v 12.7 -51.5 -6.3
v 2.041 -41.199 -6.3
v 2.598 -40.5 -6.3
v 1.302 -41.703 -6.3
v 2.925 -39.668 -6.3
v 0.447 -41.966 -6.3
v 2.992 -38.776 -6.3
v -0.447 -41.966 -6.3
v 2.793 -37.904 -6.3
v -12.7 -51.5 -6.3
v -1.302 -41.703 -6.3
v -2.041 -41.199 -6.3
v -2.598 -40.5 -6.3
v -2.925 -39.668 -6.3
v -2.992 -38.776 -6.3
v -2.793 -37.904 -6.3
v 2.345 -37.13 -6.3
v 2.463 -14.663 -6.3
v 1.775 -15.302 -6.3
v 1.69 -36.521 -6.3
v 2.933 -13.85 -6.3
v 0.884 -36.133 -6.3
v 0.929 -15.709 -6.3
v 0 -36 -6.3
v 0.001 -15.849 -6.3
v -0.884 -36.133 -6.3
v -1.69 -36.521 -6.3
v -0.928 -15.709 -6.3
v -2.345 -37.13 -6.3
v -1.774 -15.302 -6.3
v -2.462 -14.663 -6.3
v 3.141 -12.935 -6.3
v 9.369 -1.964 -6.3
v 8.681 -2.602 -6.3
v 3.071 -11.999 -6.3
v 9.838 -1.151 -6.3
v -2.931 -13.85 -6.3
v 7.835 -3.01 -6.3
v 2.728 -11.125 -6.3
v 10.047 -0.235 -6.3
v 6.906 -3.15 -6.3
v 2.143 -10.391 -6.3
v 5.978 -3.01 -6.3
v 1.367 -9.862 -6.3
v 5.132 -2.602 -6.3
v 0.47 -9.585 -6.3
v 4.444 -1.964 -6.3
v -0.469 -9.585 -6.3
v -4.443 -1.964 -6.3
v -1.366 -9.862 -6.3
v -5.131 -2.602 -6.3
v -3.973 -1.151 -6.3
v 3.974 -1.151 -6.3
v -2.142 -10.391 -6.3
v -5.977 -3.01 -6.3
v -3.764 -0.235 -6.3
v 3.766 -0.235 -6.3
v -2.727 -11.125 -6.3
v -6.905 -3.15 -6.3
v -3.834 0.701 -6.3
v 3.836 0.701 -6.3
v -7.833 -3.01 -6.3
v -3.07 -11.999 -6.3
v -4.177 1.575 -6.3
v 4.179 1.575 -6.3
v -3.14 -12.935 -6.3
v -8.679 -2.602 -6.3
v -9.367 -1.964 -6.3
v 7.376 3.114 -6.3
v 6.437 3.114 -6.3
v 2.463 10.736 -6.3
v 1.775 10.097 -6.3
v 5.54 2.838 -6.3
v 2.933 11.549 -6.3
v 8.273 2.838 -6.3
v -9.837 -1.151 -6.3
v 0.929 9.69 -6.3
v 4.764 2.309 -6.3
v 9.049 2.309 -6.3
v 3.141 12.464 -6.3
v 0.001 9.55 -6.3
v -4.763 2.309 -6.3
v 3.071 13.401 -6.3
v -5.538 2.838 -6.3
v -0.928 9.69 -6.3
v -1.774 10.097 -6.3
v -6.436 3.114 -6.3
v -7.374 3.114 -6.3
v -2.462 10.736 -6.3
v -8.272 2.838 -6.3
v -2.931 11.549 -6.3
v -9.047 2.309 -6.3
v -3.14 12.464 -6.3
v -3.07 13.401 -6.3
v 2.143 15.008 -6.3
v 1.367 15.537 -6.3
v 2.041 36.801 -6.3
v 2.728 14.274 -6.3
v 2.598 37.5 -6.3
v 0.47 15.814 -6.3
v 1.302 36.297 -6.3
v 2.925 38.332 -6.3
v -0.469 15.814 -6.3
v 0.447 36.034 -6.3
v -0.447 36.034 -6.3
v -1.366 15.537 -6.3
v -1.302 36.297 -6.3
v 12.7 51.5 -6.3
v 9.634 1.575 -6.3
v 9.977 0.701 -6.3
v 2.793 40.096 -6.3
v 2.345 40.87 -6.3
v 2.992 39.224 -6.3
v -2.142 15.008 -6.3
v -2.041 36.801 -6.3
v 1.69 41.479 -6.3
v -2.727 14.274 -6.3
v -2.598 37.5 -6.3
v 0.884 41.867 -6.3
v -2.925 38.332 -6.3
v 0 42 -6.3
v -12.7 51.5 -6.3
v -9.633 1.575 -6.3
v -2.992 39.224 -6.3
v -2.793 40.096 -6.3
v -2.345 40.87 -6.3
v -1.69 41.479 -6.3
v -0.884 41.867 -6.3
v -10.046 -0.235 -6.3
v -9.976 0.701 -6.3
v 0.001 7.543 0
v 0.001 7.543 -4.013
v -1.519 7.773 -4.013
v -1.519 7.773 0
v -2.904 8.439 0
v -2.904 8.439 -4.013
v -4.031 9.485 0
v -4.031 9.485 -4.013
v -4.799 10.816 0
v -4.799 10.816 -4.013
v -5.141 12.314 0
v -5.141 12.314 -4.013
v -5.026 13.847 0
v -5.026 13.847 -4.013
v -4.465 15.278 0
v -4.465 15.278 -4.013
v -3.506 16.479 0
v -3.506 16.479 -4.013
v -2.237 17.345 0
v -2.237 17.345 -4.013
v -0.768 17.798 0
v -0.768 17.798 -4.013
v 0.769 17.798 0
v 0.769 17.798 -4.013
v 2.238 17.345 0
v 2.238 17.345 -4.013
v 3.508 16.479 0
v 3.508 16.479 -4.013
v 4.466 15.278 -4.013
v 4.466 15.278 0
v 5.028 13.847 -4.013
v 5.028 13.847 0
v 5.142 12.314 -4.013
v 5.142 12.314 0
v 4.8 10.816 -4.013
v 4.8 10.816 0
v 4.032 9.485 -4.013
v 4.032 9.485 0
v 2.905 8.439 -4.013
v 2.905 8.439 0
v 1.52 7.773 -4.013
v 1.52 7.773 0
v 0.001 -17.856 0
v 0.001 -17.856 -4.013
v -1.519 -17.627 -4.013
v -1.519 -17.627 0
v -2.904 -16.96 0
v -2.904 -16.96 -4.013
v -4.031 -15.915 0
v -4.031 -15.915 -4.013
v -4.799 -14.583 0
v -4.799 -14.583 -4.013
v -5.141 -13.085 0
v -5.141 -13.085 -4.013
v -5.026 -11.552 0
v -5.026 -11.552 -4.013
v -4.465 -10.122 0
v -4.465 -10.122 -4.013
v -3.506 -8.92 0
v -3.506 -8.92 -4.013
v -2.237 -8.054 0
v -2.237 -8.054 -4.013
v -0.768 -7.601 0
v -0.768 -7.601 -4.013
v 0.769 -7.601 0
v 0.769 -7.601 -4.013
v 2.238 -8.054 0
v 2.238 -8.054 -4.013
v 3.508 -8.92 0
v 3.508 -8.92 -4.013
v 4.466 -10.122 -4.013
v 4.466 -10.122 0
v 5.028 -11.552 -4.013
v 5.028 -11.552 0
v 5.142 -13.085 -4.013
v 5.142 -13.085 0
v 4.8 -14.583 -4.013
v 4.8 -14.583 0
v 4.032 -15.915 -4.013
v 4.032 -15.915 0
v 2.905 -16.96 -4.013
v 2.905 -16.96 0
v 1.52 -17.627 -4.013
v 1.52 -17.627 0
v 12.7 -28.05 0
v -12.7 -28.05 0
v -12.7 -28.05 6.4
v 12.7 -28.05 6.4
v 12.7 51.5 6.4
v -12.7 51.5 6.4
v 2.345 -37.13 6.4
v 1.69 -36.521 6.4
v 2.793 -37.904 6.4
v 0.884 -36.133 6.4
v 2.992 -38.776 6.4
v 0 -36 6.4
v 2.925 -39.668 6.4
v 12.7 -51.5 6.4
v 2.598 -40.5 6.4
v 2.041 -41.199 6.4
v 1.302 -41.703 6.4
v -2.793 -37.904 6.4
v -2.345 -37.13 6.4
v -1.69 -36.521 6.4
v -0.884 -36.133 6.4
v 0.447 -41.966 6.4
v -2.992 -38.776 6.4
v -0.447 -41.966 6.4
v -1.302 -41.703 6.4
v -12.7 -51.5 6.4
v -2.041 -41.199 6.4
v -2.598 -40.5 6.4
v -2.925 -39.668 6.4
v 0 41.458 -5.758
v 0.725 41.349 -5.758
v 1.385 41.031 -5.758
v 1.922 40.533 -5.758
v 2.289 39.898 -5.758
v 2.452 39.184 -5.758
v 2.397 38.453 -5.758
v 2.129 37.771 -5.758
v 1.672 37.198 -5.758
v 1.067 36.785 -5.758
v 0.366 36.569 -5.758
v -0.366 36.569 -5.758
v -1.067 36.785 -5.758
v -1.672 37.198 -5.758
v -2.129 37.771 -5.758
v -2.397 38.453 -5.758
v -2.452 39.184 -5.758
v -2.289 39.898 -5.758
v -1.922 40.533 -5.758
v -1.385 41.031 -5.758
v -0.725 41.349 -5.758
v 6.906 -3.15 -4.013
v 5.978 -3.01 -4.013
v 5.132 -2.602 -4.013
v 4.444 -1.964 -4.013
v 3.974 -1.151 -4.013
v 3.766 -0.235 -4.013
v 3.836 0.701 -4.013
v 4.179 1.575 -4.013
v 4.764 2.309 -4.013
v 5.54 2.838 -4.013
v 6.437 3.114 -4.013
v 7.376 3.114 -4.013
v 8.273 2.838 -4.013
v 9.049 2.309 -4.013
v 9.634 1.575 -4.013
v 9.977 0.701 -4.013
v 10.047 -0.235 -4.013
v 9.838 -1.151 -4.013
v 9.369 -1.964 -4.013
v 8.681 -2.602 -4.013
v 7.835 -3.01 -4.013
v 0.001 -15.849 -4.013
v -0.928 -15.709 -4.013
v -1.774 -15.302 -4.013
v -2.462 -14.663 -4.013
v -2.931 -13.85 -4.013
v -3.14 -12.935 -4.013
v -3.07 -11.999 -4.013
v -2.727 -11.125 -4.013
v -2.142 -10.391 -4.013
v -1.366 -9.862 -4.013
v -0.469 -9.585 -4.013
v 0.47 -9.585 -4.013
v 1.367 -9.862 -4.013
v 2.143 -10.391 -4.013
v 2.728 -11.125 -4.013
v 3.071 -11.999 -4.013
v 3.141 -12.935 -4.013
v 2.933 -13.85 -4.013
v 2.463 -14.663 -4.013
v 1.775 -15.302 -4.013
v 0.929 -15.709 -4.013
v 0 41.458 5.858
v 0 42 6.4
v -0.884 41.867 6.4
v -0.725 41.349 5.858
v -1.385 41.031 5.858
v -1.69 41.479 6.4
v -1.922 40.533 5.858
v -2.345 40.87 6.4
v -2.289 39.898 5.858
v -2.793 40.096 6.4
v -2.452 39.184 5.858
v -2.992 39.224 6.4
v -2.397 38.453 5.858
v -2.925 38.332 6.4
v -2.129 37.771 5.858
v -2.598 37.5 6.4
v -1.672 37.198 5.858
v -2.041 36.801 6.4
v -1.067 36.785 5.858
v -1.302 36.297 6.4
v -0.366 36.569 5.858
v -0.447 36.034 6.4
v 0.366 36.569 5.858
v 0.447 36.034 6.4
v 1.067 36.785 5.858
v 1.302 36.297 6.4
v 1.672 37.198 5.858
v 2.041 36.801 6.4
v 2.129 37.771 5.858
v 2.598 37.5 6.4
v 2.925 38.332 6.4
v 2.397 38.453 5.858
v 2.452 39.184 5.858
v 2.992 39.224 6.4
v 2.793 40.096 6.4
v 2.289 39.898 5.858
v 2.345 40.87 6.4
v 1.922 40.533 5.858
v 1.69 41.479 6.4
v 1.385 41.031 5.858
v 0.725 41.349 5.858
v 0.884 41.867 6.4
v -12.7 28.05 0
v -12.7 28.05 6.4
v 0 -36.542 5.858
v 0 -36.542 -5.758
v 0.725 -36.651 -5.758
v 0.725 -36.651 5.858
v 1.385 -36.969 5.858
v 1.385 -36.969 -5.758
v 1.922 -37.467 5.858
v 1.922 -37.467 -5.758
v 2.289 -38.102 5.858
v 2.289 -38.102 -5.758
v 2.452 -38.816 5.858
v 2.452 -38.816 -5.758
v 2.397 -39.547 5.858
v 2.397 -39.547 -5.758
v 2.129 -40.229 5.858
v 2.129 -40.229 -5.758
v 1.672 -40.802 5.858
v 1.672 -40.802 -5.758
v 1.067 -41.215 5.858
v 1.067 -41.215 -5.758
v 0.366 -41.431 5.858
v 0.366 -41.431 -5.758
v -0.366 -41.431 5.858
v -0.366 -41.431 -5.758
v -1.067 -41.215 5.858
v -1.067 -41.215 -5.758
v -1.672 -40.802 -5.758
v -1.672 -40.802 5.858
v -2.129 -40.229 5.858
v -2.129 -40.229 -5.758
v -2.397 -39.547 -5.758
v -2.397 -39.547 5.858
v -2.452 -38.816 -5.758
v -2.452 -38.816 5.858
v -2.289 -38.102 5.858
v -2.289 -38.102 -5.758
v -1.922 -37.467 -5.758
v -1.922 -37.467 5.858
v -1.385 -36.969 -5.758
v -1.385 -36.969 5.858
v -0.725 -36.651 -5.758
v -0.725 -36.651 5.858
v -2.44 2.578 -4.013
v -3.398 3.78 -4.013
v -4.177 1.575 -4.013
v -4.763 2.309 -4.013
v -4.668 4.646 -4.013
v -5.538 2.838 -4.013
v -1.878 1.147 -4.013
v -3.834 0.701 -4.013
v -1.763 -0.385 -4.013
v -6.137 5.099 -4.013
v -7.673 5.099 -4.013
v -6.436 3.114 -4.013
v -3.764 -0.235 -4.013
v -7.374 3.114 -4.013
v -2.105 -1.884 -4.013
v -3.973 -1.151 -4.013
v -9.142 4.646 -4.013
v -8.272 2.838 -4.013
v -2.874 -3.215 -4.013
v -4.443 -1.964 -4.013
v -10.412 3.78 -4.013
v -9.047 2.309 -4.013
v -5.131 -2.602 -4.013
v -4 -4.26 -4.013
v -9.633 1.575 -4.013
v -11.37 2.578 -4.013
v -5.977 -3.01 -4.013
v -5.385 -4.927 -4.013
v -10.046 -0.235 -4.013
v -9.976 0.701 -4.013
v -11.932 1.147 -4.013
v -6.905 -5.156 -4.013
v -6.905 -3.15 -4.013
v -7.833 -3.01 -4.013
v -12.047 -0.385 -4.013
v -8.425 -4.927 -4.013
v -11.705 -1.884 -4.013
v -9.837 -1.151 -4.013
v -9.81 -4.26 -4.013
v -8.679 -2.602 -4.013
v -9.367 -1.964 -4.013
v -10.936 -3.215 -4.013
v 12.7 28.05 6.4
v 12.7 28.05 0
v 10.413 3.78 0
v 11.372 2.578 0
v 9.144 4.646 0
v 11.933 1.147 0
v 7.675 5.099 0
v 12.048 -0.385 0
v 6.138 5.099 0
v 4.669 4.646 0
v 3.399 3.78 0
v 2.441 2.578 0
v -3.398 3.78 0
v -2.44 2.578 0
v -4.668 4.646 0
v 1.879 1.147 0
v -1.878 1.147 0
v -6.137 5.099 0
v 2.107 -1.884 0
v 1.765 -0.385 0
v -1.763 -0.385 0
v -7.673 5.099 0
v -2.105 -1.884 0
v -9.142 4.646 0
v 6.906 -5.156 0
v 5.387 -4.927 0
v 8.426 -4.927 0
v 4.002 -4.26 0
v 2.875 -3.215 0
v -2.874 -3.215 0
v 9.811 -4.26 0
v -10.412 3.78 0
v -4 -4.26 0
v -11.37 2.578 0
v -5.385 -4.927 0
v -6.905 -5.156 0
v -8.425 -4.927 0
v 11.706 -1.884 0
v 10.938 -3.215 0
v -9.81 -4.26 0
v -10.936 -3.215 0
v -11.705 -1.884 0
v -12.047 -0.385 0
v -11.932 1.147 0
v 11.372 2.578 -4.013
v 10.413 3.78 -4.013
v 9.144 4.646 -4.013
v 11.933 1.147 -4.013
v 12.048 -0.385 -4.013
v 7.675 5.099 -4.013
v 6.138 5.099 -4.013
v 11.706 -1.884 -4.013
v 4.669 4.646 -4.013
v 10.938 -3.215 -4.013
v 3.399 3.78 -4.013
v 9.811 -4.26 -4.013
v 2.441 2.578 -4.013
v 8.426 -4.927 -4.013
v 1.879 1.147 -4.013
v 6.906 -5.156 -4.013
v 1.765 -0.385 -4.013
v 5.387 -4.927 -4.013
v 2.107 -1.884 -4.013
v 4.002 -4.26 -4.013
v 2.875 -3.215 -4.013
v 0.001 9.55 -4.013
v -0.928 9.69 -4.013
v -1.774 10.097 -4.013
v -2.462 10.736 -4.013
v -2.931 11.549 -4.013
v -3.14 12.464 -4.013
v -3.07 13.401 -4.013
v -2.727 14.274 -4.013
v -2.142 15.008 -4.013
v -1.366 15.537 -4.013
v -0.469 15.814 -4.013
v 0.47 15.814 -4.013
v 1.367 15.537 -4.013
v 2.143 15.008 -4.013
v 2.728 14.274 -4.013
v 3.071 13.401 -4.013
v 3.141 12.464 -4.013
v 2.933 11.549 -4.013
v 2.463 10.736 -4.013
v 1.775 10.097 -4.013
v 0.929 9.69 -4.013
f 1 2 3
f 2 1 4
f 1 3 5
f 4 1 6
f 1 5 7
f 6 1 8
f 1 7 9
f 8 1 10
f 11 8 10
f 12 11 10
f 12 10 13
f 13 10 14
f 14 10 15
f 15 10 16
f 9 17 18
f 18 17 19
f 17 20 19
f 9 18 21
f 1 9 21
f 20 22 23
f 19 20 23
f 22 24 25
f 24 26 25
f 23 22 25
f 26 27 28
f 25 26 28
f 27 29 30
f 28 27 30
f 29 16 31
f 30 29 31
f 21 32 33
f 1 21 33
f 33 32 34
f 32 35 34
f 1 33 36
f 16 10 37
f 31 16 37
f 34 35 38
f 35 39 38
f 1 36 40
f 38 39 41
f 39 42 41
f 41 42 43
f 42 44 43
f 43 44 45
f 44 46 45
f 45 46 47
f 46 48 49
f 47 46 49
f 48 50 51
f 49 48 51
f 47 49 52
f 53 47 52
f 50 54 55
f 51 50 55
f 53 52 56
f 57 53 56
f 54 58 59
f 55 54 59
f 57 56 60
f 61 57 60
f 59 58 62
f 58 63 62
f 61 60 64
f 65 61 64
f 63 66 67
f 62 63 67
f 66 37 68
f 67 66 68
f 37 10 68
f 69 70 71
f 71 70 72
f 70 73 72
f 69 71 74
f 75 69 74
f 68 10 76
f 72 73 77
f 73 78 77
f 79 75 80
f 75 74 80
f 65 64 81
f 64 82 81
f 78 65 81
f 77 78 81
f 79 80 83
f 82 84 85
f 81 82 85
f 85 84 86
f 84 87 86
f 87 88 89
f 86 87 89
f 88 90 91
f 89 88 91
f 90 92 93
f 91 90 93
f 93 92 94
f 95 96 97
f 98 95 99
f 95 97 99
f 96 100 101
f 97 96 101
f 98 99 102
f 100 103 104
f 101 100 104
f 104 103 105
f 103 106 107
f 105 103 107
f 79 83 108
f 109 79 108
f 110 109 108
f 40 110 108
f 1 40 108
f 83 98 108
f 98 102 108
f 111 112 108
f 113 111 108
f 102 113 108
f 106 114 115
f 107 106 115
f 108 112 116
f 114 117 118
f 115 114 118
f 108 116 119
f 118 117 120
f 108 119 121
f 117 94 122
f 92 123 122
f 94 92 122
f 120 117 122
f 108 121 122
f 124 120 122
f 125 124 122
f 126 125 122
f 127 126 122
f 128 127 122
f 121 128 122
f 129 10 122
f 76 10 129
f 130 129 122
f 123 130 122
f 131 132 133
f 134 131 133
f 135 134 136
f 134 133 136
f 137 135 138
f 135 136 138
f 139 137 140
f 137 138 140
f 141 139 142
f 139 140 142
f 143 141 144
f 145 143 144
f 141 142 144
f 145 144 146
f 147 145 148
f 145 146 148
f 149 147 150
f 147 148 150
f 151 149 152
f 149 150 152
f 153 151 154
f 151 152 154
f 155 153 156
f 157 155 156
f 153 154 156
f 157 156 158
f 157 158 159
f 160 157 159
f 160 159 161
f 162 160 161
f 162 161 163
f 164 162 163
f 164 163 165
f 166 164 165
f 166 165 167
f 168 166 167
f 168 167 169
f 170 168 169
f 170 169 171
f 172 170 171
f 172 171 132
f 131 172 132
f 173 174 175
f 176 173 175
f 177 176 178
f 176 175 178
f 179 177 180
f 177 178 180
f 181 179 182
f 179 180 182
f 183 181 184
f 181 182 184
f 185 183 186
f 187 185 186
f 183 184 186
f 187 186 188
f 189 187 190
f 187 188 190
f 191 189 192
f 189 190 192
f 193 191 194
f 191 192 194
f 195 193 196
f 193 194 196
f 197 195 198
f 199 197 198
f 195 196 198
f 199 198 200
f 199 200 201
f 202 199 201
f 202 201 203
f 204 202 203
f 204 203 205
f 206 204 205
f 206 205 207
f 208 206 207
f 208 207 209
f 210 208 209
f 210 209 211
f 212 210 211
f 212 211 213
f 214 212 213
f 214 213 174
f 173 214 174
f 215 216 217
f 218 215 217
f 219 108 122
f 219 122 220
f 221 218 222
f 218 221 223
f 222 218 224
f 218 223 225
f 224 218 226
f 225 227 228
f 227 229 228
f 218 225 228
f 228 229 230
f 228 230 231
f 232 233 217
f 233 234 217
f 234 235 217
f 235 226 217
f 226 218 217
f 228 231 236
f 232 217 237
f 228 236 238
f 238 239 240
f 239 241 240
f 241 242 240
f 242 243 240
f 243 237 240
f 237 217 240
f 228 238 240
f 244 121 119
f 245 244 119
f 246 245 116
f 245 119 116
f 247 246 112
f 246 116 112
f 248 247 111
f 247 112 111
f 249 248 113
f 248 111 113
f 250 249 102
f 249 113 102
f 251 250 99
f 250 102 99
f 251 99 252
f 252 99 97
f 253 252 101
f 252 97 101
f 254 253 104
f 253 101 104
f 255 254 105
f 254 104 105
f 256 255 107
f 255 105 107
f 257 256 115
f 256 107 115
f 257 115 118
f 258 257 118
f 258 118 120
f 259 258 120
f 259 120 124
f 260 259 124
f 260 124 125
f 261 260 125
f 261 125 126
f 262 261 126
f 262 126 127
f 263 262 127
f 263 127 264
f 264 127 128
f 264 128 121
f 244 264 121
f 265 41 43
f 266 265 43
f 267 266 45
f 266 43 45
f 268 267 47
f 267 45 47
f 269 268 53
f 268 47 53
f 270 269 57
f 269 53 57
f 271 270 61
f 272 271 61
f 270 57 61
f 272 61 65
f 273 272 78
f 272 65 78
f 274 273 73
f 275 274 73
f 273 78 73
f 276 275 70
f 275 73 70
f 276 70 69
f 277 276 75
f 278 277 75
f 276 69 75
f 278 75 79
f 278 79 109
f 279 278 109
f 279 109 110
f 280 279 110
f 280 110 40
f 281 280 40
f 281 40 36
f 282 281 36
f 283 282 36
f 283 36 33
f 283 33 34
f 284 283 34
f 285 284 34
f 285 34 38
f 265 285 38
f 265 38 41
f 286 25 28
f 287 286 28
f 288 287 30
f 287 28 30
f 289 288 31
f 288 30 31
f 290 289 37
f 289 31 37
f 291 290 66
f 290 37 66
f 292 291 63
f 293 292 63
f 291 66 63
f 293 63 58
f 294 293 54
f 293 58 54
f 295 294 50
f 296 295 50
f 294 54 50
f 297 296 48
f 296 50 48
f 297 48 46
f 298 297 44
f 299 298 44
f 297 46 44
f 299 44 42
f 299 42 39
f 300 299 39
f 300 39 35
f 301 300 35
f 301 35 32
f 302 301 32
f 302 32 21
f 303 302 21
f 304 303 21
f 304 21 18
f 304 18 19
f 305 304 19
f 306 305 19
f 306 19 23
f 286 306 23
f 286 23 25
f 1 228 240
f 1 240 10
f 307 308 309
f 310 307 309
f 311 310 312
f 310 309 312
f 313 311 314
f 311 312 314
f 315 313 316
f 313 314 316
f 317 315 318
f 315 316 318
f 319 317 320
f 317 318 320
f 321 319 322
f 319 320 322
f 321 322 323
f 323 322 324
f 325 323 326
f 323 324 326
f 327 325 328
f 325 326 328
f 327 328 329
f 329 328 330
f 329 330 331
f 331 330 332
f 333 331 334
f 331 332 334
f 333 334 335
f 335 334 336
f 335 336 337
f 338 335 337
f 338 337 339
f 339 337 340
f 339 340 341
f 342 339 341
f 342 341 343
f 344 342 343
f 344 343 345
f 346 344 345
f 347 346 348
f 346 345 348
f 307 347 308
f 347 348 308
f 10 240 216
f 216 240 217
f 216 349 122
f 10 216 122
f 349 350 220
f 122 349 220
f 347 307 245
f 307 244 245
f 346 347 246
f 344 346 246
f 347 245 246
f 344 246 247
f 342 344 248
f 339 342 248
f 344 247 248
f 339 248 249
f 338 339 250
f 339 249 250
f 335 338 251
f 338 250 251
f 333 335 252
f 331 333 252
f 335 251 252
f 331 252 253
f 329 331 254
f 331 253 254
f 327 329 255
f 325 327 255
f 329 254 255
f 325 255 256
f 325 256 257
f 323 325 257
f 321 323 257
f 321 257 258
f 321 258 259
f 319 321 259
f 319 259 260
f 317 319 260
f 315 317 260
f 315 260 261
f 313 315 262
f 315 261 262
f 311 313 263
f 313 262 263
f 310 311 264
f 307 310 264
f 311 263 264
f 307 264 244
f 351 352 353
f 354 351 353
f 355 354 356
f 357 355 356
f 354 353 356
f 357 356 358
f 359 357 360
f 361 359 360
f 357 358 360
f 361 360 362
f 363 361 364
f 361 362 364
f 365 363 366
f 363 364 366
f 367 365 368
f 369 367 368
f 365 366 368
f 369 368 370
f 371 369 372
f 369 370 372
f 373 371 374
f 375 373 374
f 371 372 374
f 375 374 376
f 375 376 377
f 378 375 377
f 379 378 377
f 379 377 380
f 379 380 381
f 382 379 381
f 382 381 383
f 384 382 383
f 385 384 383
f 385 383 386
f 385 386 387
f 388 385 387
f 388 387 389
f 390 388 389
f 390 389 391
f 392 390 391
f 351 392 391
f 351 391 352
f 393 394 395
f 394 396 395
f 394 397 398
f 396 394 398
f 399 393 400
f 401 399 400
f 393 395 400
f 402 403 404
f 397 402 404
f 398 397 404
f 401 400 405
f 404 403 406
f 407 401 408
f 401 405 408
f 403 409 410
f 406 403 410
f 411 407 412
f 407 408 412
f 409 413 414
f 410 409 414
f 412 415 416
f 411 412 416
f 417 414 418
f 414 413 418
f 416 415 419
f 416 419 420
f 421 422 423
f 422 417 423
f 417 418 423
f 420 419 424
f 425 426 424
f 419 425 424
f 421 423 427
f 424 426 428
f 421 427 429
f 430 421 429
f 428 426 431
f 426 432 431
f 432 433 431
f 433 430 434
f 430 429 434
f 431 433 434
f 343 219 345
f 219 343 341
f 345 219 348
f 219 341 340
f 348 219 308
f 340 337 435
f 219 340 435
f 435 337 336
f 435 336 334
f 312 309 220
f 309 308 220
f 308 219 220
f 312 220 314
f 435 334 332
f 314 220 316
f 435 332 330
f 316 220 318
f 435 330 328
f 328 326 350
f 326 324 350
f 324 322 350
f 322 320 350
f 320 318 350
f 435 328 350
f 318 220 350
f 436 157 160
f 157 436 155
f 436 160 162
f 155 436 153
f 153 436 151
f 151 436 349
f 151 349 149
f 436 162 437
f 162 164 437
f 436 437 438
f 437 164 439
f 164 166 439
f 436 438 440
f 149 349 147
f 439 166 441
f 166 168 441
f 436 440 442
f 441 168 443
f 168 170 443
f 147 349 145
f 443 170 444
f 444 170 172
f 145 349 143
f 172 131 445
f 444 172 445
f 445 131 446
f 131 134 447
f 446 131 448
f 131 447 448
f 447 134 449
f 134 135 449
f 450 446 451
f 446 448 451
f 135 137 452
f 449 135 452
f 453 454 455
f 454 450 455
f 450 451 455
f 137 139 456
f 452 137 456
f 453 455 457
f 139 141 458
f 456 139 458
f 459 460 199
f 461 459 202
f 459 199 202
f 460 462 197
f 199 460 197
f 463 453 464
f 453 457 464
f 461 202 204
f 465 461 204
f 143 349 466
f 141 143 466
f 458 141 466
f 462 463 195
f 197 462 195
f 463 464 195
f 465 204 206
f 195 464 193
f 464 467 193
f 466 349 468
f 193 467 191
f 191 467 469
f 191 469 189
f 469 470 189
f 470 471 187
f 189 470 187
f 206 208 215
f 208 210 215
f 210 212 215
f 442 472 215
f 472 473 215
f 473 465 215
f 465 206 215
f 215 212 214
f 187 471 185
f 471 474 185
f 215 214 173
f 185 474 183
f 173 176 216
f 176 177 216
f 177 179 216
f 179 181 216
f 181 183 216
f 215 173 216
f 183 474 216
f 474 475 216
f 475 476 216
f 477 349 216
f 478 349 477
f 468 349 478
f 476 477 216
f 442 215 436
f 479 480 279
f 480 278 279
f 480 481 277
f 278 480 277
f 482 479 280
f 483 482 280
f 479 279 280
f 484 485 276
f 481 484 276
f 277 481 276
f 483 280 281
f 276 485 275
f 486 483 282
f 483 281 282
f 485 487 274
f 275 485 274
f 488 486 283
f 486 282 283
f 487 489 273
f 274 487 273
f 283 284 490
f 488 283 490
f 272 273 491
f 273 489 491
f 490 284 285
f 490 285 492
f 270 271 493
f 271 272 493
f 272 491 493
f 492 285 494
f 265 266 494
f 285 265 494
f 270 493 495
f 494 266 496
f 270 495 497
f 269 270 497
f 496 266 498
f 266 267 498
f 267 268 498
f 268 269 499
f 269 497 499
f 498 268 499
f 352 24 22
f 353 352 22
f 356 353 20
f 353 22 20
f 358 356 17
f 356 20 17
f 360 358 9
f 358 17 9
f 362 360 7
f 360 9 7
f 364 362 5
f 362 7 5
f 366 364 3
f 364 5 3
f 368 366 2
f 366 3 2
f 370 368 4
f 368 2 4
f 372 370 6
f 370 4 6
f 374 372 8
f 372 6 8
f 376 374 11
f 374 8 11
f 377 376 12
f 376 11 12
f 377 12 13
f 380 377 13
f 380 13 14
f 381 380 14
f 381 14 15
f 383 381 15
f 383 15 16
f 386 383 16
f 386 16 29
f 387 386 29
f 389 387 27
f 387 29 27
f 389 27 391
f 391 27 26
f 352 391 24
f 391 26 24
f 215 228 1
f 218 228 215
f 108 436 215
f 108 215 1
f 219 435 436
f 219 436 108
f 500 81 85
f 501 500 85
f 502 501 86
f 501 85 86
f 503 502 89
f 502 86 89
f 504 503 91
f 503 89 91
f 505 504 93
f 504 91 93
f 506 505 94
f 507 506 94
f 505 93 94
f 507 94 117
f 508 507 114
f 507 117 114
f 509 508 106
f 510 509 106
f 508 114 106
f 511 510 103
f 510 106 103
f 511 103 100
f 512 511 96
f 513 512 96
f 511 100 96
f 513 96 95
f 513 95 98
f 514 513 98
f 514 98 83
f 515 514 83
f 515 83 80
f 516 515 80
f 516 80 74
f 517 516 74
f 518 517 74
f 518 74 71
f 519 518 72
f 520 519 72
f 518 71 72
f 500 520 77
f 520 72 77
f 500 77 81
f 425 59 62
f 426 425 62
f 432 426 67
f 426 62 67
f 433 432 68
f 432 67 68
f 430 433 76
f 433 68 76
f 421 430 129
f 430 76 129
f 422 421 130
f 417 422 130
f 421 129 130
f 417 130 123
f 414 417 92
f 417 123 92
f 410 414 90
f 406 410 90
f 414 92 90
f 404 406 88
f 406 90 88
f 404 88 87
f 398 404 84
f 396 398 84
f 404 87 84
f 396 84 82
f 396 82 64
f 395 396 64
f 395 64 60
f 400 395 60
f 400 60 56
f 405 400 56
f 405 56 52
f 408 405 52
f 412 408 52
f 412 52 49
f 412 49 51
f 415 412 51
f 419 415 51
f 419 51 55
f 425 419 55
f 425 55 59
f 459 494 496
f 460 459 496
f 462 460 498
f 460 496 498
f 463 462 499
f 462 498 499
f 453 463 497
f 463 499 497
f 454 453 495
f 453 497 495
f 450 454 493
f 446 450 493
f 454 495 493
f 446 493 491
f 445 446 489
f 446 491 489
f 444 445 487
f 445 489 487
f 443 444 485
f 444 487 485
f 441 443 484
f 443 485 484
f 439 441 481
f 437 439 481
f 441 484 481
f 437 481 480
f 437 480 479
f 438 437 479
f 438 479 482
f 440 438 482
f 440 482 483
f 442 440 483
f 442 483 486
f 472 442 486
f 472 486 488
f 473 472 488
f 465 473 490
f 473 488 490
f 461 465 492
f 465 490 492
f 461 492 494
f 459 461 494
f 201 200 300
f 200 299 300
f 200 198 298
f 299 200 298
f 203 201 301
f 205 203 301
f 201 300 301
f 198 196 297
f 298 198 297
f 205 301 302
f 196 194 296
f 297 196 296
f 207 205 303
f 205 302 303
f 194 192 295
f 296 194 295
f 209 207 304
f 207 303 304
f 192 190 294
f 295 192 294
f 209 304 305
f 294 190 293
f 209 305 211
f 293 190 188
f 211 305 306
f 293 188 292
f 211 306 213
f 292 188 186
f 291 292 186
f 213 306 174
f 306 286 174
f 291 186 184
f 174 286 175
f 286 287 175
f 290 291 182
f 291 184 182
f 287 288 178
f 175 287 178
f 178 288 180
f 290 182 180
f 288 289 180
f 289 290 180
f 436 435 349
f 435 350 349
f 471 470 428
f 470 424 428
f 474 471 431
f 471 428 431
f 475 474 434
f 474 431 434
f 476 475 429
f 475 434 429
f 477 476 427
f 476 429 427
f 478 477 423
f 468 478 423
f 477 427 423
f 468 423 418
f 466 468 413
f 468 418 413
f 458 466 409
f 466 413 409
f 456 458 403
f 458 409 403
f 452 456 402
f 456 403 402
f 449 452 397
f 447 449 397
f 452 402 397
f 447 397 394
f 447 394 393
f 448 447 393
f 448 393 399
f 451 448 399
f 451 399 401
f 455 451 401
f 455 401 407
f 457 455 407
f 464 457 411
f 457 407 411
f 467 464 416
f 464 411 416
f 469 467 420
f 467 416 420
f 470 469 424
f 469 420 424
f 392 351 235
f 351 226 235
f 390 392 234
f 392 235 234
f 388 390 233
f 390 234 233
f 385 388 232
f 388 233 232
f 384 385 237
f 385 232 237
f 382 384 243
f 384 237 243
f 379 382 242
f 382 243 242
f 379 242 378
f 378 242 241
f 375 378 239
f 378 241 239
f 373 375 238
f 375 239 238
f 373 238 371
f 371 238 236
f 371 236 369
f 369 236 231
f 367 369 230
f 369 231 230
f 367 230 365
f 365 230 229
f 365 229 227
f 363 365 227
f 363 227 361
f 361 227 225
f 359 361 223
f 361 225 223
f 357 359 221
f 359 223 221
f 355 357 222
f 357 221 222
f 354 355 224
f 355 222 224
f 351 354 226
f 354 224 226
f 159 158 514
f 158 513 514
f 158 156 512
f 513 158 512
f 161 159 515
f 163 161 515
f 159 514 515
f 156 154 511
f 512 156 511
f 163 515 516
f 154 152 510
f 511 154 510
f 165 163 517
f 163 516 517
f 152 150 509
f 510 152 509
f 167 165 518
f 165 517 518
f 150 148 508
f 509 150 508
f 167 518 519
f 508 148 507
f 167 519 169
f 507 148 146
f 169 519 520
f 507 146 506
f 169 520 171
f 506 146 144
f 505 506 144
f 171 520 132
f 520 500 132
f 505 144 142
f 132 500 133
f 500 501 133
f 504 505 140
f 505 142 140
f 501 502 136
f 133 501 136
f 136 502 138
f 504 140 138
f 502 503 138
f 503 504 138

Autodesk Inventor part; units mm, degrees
sketch "Sketch_1" plane through (0, 0, 0) normal (1, 0, 0) x (0, 1, 0)
  line L0 (-28.05, 6.4) -> (-51.5, 6.4)
  line L1 (-51.5, 6.4) -> (-51.5, -6.3)
  line L2 (-51.5, -6.3) -> (51.5, -6.3)
  line L3 (51.5, -6.3) -> (51.5, 6.4)
  line L4 (51.5, 6.4) -> (28.05, 6.4)
  line L5 (28.05, 6.4) -> (28.05, 0)
  line L6 (28.05, 0) -> (-28.05, 0)
  line L7 (-28.05, 0) -> (-28.05, 6.4)
extrude "Extrusion1" add sketch "Sketch_1" along normal mid plane 25.4
sketch "Sketch_2" plane through (0, 0, 0) normal (1, 0, 0) x (0, 1, 0)
  line L0 (39, -6.3) -> (39, 6.4)
  line L1 (39, 6.4) -> (42, 6.4)
  line L2 (42, 6.4) -> (41.4585, 5.8585)
  line L3 (41.4585, 5.8585) -> (41.4585, -5.7585)
  line L4 (41.4585, -5.7585) -> (42, -6.3)
  line L5 (42, -6.3) -> (39, -6.3)
  line L6 (39, -6.3) -> (39, 6.4)
revolve "Revolution1" cut sketch "Sketch_2" angle 360 about axis through (0, 39, -6.3) along (0, 0, -1)
thread "Thread1" size "M6x1" class "6H" standard "ISO Metric profile" full length
sketch "Sketch_3" plane through (0, 0, 0) normal (1, 0, 0) x (0, 1, 0)
  line L0 (-39, -6.3) -> (-39, 6.4)
  line L1 (-39, 6.4) -> (-36, 6.4)
  line L2 (-36, 6.4) -> (-36.5415, 5.8585)
  line L3 (-36.5415, 5.8585) -> (-36.5415, -5.7585)
  line L4 (-36.5415, -5.7585) -> (-36, -6.3)
  line L5 (-36, -6.3) -> (-39, -6.3)
  line L6 (-39, -6.3) -> (-39, 6.4)
revolve "Revolution2" cut sketch "Sketch_3" angle 360 about axis through (0, -39, -6.3) along (0, 0, -1)
thread "Thread2" size "M6x1" class "6H" standard "ISO Metric profile" full length
sketch "Sketch4" plane through (-12.7, -28.05, 0) normal (0, 0, 1) x (1, 0, 0)
  point P0 (5.795, 28.05)
hole "Hole1" at (-6.905, 0, 0) direction (0, 0, -1) diameter 6.2992 depth 6.3 counterbore diameter 10.3124 counterbore depth 4.0132
pattern_linear "Rectangular Pattern1" count 2 spacing 14.4558 along (0.4777, 0.8785, 0) count 2 spacing 14.4558 along (0.4777, -0.8785, 0) of "Hole1"
ref_plane "screw1_XY" through (-6.905, 0, -4.0132) normal (0, 0, 1) x (1, 0, 0)
ref_plane "screw1_YZ" through (-6.905, 0, -4.0132) normal (1, 0, 0) x (0, 1, 0)
ref_plane "screw1_ZX" through (-6.905, 0, -4.0132) normal (0, 1, 0) x (0, 0, 1)
ref_plane "screw1_1_XY" through (0, 12.7, -4.0132) normal (0, 0, 1) x (1, 0, 0)
ref_plane "screw1_1_YZ" through (0, 12.7, -4.0132) normal (1, 0, 0) x (0, 1, 0)
ref_plane "screw1_1_ZX" through (0, 12.7, -4.0132) normal (0, 1, 0) x (0, 0, 1)
ref_plane "screw2_XY" through (6.905, 0, -4.0132) normal (0, 0, 1) x (1, 0, 0)
ref_plane "screw2_YZ" through (6.905, 0, -4.0132) normal (1, 0, 0) x (0, 1, 0)
ref_plane "screw2_ZX" through (6.905, 0, -4.0132) normal (0, 1, 0) x (0, 0, 1)
ref_plane "screw2_1_XY" through (0, -12.7, -4.0132) normal (0, 0, 1) x (1, 0, 0)
ref_plane "screw2_1_YZ" through (0, -12.7, -4.0132) normal (1, 0, 0) x (0, 1, 0)
ref_plane "screw2_1_ZX" through (0, -12.7, -4.0132) normal (0, 1, 0) x (0, 0, 1)
ref_plane "to_dummy_XY" through (0, 0, 0) normal (0, 0, 1) x (1, 0, 0)
ref_plane "to_dummy_YZ" through (0, 0, 0) normal (1, 0, 0) x (0, 1, 0)
ref_plane "to_dummy_ZX" through (0, 0, 0) normal (0, 1, 0) x (0, 0, 1)
ref_plane "to_wheel1_XY" through (0, 39, 6.4) normal (0, 0, 1) x (1, 0, 0)
ref_plane "to_wheel1_YZ" through (0, 39, 6.4) normal (1, 0, 0) x (0, 1, 0)
ref_plane "to_wheel1_ZX" through (0, 39, 6.4) normal (0, 1, 0) x (0, 0, 1)
ref_plane "to_wheel2_XY" through (0, -39, 6.4) normal (0, 0, 1) x (1, 0, 0)
ref_plane "to_wheel2_YZ" through (0, -39, 6.4) normal (1, 0, 0) x (0, 1, 0)
ref_plane "to_wheel2_ZX" through (0, -39, 6.4) normal (0, 1, 0) x (0, 0, 1)
sketch "Sketch5" plane through (12.7, 0, 0) normal (1, 0, 0) x (0, 0, -1)
  line L0 (-5.8585, 36.5415) -> (-5.8585, 41.4585) projected
  line L1 (-5.8585, 39) -> (-5.8585, -3)
  line L2 (-6.4, 28.05) -> (0, 28.05) projected
  line L3 (6.3, -51.5) -> (6.3, 51.5) projected
  line L4 (-6.4, 28.05) -> (6.3, 28.05)
  line L5 (6.3, 28.05) -> (6.3, -51.5)
  line L6 (6.3, -51.5) -> (-6.4, -51.5)
  line L7 (-6.4, -51.5) -> (-6.4, 28.05)
  point P0 (0, 0)
  dimension "d28" = 42
properties part number "25-2752-1_p"
